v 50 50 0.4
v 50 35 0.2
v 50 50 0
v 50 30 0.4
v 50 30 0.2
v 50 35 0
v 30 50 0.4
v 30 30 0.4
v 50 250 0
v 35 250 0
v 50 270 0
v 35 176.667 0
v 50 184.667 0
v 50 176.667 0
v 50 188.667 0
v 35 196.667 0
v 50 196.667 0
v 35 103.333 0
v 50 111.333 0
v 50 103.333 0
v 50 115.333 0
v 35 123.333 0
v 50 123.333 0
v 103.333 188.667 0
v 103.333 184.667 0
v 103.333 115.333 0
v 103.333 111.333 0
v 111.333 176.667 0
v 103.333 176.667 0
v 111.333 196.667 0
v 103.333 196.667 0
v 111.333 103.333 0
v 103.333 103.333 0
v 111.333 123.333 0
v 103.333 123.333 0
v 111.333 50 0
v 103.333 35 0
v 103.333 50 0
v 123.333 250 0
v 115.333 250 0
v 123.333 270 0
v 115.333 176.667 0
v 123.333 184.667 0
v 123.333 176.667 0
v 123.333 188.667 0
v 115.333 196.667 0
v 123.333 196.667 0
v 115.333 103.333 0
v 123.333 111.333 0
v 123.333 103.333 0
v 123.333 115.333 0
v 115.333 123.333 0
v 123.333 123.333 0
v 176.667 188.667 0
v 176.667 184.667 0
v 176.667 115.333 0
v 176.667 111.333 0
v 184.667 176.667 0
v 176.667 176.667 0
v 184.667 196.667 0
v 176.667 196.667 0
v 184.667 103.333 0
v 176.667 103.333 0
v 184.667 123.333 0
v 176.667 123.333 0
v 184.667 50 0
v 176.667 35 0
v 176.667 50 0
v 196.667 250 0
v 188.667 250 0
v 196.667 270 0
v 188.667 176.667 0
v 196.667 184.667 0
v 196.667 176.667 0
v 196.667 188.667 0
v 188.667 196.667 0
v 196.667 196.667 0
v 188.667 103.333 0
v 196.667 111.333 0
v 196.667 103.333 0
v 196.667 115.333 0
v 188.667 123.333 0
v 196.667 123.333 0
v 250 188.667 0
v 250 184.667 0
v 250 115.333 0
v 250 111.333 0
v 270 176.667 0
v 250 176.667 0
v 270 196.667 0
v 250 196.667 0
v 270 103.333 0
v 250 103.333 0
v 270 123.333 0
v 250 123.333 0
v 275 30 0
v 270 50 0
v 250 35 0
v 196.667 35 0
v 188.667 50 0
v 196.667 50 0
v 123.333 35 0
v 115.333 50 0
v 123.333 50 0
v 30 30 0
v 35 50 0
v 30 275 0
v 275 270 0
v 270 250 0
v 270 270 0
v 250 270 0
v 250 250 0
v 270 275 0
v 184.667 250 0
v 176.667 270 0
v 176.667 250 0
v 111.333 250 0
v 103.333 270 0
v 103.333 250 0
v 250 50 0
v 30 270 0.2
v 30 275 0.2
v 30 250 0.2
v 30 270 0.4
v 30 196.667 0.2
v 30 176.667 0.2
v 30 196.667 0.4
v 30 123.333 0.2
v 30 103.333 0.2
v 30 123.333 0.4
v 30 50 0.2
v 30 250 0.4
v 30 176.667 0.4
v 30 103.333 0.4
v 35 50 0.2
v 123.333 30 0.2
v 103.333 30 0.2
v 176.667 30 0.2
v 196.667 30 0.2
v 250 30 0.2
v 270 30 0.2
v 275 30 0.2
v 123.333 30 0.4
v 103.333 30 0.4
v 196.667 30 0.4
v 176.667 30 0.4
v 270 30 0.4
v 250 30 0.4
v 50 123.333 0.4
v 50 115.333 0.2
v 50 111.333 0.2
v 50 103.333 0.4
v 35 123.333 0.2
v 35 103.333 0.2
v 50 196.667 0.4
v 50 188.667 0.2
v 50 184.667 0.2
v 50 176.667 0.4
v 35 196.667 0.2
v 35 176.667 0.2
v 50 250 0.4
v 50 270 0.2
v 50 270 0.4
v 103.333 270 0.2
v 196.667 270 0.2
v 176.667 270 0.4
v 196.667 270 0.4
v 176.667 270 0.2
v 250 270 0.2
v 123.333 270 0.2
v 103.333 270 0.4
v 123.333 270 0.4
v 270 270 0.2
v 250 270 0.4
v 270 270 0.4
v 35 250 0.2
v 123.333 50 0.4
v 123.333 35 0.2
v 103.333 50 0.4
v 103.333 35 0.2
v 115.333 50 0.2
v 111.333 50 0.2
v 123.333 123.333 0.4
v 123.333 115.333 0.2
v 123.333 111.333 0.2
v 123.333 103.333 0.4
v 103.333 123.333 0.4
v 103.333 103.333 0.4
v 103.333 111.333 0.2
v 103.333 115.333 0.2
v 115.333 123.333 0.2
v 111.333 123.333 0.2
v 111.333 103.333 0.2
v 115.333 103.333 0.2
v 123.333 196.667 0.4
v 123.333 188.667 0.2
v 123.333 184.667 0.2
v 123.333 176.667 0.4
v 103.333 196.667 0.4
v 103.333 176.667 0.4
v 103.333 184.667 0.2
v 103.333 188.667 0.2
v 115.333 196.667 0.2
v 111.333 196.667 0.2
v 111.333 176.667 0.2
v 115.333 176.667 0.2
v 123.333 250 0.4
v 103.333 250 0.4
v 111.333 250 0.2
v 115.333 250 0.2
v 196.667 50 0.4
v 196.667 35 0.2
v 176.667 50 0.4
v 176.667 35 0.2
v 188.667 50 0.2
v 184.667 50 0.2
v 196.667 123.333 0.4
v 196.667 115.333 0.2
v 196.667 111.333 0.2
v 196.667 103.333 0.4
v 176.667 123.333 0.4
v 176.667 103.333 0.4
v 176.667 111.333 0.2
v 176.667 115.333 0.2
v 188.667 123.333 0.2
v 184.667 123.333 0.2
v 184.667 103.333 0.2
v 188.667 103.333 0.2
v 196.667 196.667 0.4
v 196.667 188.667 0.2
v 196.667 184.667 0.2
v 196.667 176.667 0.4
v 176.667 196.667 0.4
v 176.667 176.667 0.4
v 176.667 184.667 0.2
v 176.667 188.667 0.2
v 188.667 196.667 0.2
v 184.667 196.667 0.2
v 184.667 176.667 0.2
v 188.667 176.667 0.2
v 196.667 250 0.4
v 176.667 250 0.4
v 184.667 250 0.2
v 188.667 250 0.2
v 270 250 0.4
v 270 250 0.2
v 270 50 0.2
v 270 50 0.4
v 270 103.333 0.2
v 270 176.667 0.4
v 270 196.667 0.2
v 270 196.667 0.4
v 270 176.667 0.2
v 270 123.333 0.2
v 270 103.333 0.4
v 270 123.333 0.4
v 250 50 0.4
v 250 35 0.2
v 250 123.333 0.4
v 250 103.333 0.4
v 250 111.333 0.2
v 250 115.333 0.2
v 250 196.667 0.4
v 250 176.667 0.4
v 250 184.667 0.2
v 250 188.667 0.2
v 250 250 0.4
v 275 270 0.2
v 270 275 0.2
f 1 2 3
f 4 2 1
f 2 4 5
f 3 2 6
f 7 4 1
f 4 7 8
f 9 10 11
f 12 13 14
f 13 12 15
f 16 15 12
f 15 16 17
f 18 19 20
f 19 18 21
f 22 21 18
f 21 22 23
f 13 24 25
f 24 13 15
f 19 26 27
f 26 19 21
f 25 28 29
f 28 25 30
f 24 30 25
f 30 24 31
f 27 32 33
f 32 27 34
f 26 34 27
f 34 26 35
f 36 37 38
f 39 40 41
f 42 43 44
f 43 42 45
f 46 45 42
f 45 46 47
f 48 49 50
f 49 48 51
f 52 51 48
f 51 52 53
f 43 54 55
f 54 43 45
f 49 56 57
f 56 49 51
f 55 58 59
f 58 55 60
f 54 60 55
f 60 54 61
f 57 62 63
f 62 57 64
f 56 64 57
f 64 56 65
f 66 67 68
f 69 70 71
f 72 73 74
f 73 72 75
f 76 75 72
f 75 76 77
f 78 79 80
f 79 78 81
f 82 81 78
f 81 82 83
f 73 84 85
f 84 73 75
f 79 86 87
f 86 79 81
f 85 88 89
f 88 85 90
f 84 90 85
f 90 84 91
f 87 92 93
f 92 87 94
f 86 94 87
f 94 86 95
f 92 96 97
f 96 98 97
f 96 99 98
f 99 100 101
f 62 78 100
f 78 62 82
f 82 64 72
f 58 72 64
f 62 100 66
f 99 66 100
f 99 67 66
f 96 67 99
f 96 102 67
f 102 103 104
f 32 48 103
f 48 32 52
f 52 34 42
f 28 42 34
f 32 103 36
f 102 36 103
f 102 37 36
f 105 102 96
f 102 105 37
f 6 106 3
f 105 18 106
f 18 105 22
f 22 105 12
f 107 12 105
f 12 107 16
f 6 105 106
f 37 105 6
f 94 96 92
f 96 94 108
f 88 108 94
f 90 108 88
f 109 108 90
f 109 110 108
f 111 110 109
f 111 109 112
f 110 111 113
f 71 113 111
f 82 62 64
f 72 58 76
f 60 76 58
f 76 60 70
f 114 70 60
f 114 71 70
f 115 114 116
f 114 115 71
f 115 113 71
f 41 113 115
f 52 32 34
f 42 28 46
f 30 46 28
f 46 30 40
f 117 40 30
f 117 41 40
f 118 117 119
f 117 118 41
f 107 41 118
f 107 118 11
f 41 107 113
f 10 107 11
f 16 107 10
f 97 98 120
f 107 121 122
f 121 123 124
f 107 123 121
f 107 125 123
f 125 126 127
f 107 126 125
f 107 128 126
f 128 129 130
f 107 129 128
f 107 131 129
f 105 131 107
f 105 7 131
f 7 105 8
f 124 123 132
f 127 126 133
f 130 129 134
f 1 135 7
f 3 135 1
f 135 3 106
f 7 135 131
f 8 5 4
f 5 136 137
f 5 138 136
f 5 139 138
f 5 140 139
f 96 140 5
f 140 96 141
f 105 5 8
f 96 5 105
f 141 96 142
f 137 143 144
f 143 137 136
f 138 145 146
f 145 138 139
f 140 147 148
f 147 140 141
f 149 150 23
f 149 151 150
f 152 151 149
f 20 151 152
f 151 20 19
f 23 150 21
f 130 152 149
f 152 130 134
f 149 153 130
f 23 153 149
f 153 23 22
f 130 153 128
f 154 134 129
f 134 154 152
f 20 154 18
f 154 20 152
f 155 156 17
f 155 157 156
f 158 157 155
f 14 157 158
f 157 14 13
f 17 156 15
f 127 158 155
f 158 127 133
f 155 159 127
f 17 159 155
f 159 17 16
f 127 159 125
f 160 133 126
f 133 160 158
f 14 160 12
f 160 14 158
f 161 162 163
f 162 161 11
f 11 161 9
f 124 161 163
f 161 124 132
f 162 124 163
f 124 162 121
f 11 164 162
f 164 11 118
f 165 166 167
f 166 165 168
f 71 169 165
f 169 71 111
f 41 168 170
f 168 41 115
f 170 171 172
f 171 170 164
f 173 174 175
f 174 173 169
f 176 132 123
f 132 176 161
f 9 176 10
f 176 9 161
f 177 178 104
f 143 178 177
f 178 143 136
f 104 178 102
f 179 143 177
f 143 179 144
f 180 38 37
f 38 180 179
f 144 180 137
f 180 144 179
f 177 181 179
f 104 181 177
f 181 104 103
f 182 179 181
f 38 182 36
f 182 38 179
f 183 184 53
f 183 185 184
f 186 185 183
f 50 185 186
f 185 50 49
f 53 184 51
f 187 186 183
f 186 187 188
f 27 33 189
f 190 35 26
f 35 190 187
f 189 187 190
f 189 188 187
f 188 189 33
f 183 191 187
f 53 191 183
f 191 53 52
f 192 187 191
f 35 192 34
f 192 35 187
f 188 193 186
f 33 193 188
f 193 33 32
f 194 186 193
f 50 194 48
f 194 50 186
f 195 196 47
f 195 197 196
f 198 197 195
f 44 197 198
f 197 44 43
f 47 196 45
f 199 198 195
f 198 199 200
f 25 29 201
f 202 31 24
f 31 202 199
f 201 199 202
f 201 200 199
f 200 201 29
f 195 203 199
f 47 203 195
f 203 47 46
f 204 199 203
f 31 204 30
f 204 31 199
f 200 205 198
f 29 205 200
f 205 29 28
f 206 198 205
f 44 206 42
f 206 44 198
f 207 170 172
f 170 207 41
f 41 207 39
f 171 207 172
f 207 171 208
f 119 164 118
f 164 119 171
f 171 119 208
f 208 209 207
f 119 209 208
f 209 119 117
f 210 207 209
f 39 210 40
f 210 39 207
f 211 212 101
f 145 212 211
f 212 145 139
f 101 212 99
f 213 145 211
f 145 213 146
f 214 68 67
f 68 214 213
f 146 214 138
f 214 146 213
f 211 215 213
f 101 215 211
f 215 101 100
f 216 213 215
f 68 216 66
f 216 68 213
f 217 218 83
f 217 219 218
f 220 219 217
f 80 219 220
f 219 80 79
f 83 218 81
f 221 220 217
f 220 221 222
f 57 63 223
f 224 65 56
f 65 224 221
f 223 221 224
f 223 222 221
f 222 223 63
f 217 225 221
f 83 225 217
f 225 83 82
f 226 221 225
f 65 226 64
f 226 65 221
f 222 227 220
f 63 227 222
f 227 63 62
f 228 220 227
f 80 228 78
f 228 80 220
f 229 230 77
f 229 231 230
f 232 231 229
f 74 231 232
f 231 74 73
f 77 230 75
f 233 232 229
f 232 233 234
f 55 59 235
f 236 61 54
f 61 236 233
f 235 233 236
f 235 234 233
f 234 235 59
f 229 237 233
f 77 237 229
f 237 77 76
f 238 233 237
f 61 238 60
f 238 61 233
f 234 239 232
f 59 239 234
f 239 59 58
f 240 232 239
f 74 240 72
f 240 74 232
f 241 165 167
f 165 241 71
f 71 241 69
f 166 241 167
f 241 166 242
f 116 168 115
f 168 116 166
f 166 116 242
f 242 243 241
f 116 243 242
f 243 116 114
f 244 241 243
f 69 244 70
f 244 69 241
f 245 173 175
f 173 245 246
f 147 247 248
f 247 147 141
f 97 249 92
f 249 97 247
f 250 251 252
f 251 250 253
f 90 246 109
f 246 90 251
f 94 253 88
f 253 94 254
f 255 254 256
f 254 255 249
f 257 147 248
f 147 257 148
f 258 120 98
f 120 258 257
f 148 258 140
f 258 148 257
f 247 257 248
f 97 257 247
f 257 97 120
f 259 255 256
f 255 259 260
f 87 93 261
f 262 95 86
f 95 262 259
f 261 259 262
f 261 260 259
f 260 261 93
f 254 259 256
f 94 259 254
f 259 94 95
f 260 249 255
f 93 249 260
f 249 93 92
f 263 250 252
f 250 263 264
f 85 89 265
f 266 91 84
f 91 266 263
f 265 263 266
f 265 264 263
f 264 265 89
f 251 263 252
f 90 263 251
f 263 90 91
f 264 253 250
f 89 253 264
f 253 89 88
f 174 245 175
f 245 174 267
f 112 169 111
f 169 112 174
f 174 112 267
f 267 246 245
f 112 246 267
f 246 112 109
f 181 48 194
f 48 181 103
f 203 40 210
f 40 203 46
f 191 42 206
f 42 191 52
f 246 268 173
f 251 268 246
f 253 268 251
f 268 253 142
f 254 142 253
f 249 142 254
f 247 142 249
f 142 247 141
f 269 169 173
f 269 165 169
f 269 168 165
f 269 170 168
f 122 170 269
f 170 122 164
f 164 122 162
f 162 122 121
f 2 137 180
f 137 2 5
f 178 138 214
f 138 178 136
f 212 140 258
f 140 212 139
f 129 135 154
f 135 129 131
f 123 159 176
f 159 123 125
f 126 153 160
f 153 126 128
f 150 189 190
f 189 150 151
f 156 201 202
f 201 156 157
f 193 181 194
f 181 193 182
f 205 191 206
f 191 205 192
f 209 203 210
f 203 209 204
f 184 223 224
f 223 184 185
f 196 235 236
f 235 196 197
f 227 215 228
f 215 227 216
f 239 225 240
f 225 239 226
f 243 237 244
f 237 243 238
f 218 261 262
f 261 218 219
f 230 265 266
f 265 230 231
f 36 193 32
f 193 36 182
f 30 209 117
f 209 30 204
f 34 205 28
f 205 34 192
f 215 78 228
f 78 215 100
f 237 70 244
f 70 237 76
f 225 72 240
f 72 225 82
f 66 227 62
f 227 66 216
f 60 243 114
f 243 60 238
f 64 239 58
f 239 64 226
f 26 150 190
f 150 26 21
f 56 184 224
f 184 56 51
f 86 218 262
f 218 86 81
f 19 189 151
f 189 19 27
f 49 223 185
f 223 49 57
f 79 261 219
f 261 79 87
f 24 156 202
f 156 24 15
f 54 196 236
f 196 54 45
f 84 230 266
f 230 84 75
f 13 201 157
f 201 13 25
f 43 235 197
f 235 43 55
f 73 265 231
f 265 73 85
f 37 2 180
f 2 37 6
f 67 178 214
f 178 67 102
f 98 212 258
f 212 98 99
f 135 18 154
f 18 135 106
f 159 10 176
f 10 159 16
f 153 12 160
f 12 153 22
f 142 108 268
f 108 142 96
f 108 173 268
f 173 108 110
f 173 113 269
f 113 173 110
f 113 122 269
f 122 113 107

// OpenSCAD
n = 4;
tileSize = 20;  // square of this size
padding = 30;    // padding around the print
xMax = 300;
yMax = 300;

gap = (xMax - 2 * padding - n * tileSize)/(n - 1);

for (x = [0 : n-1] ) {
  for (y = [0 : n-1] ) {
    translate([padding + x * (gap + tileSize), padding + y * (gap + tileSize),0]) {
      cube([tileSize, tileSize, 0.4],false);
    }
  }    
}

translate([padding, padding, 0]) {
  cube([xMax - 2 * padding, 5, 0.2],false);
}

translate([padding, padding, 0]) {
  cube([5, yMax - 2 * padding, 0.2],false);
}

translate([xMax - padding, padding, 0]) {
  cube([5, yMax - 2 * padding, 0.2],false);
}

translate([padding, yMax - padding, 0]) {
  cube([xMax - 2 * padding, 5, 0.2],false);
}

for (x = [1 : n-2] ) {
  translate([padding + x * (gap + tileSize) + tileSize/2 - 2, padding, 0]) {
    cube([4, yMax - 2 * padding, 0.2],false);
  }
}

for (y = [1 : n-2] ) {
  translate([padding, padding + y * (gap + tileSize) + tileSize/2 - 2, 0]) {
    cube([xMax - 2 * padding, 4, 0.2],false);
  }
}
